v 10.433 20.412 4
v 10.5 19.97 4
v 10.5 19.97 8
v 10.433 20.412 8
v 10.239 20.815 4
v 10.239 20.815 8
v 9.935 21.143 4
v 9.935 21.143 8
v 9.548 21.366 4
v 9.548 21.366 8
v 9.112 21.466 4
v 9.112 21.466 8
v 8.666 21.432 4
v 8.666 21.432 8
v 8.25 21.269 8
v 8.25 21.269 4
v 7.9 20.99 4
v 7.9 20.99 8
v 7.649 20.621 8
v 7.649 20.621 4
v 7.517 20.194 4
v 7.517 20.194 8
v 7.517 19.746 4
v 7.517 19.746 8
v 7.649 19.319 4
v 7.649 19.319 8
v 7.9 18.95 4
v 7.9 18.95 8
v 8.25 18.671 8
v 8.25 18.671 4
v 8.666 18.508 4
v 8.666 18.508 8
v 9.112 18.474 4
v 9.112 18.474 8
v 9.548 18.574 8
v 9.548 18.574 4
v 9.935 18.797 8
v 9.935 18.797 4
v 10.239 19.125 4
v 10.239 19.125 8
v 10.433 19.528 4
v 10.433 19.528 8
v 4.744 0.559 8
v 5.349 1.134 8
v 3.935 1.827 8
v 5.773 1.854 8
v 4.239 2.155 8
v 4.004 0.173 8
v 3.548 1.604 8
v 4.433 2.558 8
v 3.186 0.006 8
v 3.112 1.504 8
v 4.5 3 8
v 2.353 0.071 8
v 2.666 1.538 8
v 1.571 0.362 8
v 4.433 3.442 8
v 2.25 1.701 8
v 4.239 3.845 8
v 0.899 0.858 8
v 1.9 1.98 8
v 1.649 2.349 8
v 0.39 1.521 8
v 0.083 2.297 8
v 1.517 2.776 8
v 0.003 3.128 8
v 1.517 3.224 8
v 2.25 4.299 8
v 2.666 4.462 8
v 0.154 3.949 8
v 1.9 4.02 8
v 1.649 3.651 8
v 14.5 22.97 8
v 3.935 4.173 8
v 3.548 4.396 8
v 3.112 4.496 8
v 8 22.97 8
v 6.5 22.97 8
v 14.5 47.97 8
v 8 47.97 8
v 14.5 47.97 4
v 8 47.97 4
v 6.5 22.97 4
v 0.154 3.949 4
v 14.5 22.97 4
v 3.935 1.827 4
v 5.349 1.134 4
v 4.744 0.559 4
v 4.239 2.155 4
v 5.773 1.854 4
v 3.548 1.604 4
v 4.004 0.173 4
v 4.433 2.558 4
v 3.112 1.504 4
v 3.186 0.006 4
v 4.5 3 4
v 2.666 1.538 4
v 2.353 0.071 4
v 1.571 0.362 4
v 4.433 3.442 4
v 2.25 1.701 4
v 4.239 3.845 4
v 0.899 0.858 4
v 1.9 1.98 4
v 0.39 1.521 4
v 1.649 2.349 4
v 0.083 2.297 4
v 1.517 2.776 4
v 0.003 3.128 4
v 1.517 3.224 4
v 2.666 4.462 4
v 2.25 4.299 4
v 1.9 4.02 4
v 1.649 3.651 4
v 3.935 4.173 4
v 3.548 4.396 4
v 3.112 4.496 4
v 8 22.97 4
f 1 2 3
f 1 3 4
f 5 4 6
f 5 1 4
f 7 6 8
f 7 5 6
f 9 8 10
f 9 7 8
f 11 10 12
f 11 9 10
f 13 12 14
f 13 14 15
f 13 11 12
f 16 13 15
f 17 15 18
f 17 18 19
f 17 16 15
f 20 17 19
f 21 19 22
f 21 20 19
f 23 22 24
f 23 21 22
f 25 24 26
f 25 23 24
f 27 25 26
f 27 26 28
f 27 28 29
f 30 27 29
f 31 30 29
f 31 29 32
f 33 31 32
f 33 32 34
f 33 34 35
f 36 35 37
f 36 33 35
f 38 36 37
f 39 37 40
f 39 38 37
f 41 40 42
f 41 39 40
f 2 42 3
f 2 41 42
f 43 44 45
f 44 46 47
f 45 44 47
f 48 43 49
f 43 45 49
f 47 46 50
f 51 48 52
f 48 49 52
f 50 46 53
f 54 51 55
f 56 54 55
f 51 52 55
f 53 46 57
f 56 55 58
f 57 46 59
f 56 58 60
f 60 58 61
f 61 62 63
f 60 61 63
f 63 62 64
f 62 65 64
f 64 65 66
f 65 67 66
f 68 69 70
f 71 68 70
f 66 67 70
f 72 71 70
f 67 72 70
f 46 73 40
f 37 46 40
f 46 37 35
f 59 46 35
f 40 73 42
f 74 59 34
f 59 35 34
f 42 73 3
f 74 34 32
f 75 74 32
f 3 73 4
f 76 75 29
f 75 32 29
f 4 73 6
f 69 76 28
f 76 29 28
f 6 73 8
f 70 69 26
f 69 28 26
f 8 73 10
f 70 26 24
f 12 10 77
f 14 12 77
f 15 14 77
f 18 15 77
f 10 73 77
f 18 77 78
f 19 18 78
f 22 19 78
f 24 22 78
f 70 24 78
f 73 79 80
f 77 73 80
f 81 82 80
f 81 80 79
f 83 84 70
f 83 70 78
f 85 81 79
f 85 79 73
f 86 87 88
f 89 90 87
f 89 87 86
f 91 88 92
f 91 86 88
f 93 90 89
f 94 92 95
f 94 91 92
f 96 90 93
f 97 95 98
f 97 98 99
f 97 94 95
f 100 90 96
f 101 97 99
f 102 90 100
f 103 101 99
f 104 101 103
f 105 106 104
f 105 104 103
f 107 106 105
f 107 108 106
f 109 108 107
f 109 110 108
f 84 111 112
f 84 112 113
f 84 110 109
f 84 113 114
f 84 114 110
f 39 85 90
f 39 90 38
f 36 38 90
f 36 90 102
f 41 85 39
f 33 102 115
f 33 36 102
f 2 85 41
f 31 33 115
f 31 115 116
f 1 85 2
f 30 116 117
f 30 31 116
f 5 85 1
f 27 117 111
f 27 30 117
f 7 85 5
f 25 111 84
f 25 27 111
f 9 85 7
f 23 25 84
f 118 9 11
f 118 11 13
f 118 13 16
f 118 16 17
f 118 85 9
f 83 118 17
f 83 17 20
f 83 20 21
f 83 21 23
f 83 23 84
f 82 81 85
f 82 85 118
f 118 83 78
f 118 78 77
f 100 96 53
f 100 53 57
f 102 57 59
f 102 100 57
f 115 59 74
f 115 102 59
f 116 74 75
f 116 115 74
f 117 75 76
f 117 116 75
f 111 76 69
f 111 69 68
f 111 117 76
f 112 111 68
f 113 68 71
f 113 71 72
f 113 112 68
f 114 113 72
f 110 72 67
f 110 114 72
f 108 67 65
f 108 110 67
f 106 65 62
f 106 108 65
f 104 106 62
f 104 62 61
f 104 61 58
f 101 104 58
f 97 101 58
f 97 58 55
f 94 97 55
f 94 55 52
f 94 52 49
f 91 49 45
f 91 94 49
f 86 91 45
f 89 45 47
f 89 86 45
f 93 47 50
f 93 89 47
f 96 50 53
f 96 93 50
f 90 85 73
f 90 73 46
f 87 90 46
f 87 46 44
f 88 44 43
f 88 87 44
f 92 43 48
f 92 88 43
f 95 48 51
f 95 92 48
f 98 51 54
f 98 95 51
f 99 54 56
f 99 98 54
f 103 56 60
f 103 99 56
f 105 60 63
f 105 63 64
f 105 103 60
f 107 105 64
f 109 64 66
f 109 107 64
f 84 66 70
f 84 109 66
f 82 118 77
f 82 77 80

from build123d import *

# Parameters (mm, degrees)
SKETCH1_R           = 1.499999946
SKETCH1_R_2         = 1.500000009
BOSS_EXTRUDE2_DEPTH = 4


# Read off the part's stored shape, not the designer's step: Imported1
with BuildPart() as part:
    # Sketch1 → Boss-Extrude2 (new body)
    with BuildSketch(Plane.XY.offset(4.00000019)):
        with BuildLine():
            Line((8.00000038, 47.970000654), (14.499999583, 47.970000654))
            Line((14.499999583, 47.970000654), (14.499999583, 22.970002145))
            Line((14.499999583, 22.970002145), (5.772520595, 1.854081769))
            ThreePointArc((5.772520595, 1.854081769), (1.951680977, 0.189123339), (0.154201944, 3.949438629))
            Line((0.154201944, 3.949438629), (6.500000134, 22.970002145))
            Line((6.500000134, 22.970002145), (8.00000038, 22.970002145))
            Line((8.00000038, 22.970002145), (8.00000038, 47.970000654))
        make_face()
        with Locations((9.000000172, 19.969999637)):
            Circle(SKETCH1_R, mode=Mode.SUBTRACT)
        with Locations((3.000000037, 2.99999995)):
            Circle(SKETCH1_R_2, mode=Mode.SUBTRACT)
    extrude(amount=BOSS_EXTRUDE2_DEPTH)


solid = part.part
